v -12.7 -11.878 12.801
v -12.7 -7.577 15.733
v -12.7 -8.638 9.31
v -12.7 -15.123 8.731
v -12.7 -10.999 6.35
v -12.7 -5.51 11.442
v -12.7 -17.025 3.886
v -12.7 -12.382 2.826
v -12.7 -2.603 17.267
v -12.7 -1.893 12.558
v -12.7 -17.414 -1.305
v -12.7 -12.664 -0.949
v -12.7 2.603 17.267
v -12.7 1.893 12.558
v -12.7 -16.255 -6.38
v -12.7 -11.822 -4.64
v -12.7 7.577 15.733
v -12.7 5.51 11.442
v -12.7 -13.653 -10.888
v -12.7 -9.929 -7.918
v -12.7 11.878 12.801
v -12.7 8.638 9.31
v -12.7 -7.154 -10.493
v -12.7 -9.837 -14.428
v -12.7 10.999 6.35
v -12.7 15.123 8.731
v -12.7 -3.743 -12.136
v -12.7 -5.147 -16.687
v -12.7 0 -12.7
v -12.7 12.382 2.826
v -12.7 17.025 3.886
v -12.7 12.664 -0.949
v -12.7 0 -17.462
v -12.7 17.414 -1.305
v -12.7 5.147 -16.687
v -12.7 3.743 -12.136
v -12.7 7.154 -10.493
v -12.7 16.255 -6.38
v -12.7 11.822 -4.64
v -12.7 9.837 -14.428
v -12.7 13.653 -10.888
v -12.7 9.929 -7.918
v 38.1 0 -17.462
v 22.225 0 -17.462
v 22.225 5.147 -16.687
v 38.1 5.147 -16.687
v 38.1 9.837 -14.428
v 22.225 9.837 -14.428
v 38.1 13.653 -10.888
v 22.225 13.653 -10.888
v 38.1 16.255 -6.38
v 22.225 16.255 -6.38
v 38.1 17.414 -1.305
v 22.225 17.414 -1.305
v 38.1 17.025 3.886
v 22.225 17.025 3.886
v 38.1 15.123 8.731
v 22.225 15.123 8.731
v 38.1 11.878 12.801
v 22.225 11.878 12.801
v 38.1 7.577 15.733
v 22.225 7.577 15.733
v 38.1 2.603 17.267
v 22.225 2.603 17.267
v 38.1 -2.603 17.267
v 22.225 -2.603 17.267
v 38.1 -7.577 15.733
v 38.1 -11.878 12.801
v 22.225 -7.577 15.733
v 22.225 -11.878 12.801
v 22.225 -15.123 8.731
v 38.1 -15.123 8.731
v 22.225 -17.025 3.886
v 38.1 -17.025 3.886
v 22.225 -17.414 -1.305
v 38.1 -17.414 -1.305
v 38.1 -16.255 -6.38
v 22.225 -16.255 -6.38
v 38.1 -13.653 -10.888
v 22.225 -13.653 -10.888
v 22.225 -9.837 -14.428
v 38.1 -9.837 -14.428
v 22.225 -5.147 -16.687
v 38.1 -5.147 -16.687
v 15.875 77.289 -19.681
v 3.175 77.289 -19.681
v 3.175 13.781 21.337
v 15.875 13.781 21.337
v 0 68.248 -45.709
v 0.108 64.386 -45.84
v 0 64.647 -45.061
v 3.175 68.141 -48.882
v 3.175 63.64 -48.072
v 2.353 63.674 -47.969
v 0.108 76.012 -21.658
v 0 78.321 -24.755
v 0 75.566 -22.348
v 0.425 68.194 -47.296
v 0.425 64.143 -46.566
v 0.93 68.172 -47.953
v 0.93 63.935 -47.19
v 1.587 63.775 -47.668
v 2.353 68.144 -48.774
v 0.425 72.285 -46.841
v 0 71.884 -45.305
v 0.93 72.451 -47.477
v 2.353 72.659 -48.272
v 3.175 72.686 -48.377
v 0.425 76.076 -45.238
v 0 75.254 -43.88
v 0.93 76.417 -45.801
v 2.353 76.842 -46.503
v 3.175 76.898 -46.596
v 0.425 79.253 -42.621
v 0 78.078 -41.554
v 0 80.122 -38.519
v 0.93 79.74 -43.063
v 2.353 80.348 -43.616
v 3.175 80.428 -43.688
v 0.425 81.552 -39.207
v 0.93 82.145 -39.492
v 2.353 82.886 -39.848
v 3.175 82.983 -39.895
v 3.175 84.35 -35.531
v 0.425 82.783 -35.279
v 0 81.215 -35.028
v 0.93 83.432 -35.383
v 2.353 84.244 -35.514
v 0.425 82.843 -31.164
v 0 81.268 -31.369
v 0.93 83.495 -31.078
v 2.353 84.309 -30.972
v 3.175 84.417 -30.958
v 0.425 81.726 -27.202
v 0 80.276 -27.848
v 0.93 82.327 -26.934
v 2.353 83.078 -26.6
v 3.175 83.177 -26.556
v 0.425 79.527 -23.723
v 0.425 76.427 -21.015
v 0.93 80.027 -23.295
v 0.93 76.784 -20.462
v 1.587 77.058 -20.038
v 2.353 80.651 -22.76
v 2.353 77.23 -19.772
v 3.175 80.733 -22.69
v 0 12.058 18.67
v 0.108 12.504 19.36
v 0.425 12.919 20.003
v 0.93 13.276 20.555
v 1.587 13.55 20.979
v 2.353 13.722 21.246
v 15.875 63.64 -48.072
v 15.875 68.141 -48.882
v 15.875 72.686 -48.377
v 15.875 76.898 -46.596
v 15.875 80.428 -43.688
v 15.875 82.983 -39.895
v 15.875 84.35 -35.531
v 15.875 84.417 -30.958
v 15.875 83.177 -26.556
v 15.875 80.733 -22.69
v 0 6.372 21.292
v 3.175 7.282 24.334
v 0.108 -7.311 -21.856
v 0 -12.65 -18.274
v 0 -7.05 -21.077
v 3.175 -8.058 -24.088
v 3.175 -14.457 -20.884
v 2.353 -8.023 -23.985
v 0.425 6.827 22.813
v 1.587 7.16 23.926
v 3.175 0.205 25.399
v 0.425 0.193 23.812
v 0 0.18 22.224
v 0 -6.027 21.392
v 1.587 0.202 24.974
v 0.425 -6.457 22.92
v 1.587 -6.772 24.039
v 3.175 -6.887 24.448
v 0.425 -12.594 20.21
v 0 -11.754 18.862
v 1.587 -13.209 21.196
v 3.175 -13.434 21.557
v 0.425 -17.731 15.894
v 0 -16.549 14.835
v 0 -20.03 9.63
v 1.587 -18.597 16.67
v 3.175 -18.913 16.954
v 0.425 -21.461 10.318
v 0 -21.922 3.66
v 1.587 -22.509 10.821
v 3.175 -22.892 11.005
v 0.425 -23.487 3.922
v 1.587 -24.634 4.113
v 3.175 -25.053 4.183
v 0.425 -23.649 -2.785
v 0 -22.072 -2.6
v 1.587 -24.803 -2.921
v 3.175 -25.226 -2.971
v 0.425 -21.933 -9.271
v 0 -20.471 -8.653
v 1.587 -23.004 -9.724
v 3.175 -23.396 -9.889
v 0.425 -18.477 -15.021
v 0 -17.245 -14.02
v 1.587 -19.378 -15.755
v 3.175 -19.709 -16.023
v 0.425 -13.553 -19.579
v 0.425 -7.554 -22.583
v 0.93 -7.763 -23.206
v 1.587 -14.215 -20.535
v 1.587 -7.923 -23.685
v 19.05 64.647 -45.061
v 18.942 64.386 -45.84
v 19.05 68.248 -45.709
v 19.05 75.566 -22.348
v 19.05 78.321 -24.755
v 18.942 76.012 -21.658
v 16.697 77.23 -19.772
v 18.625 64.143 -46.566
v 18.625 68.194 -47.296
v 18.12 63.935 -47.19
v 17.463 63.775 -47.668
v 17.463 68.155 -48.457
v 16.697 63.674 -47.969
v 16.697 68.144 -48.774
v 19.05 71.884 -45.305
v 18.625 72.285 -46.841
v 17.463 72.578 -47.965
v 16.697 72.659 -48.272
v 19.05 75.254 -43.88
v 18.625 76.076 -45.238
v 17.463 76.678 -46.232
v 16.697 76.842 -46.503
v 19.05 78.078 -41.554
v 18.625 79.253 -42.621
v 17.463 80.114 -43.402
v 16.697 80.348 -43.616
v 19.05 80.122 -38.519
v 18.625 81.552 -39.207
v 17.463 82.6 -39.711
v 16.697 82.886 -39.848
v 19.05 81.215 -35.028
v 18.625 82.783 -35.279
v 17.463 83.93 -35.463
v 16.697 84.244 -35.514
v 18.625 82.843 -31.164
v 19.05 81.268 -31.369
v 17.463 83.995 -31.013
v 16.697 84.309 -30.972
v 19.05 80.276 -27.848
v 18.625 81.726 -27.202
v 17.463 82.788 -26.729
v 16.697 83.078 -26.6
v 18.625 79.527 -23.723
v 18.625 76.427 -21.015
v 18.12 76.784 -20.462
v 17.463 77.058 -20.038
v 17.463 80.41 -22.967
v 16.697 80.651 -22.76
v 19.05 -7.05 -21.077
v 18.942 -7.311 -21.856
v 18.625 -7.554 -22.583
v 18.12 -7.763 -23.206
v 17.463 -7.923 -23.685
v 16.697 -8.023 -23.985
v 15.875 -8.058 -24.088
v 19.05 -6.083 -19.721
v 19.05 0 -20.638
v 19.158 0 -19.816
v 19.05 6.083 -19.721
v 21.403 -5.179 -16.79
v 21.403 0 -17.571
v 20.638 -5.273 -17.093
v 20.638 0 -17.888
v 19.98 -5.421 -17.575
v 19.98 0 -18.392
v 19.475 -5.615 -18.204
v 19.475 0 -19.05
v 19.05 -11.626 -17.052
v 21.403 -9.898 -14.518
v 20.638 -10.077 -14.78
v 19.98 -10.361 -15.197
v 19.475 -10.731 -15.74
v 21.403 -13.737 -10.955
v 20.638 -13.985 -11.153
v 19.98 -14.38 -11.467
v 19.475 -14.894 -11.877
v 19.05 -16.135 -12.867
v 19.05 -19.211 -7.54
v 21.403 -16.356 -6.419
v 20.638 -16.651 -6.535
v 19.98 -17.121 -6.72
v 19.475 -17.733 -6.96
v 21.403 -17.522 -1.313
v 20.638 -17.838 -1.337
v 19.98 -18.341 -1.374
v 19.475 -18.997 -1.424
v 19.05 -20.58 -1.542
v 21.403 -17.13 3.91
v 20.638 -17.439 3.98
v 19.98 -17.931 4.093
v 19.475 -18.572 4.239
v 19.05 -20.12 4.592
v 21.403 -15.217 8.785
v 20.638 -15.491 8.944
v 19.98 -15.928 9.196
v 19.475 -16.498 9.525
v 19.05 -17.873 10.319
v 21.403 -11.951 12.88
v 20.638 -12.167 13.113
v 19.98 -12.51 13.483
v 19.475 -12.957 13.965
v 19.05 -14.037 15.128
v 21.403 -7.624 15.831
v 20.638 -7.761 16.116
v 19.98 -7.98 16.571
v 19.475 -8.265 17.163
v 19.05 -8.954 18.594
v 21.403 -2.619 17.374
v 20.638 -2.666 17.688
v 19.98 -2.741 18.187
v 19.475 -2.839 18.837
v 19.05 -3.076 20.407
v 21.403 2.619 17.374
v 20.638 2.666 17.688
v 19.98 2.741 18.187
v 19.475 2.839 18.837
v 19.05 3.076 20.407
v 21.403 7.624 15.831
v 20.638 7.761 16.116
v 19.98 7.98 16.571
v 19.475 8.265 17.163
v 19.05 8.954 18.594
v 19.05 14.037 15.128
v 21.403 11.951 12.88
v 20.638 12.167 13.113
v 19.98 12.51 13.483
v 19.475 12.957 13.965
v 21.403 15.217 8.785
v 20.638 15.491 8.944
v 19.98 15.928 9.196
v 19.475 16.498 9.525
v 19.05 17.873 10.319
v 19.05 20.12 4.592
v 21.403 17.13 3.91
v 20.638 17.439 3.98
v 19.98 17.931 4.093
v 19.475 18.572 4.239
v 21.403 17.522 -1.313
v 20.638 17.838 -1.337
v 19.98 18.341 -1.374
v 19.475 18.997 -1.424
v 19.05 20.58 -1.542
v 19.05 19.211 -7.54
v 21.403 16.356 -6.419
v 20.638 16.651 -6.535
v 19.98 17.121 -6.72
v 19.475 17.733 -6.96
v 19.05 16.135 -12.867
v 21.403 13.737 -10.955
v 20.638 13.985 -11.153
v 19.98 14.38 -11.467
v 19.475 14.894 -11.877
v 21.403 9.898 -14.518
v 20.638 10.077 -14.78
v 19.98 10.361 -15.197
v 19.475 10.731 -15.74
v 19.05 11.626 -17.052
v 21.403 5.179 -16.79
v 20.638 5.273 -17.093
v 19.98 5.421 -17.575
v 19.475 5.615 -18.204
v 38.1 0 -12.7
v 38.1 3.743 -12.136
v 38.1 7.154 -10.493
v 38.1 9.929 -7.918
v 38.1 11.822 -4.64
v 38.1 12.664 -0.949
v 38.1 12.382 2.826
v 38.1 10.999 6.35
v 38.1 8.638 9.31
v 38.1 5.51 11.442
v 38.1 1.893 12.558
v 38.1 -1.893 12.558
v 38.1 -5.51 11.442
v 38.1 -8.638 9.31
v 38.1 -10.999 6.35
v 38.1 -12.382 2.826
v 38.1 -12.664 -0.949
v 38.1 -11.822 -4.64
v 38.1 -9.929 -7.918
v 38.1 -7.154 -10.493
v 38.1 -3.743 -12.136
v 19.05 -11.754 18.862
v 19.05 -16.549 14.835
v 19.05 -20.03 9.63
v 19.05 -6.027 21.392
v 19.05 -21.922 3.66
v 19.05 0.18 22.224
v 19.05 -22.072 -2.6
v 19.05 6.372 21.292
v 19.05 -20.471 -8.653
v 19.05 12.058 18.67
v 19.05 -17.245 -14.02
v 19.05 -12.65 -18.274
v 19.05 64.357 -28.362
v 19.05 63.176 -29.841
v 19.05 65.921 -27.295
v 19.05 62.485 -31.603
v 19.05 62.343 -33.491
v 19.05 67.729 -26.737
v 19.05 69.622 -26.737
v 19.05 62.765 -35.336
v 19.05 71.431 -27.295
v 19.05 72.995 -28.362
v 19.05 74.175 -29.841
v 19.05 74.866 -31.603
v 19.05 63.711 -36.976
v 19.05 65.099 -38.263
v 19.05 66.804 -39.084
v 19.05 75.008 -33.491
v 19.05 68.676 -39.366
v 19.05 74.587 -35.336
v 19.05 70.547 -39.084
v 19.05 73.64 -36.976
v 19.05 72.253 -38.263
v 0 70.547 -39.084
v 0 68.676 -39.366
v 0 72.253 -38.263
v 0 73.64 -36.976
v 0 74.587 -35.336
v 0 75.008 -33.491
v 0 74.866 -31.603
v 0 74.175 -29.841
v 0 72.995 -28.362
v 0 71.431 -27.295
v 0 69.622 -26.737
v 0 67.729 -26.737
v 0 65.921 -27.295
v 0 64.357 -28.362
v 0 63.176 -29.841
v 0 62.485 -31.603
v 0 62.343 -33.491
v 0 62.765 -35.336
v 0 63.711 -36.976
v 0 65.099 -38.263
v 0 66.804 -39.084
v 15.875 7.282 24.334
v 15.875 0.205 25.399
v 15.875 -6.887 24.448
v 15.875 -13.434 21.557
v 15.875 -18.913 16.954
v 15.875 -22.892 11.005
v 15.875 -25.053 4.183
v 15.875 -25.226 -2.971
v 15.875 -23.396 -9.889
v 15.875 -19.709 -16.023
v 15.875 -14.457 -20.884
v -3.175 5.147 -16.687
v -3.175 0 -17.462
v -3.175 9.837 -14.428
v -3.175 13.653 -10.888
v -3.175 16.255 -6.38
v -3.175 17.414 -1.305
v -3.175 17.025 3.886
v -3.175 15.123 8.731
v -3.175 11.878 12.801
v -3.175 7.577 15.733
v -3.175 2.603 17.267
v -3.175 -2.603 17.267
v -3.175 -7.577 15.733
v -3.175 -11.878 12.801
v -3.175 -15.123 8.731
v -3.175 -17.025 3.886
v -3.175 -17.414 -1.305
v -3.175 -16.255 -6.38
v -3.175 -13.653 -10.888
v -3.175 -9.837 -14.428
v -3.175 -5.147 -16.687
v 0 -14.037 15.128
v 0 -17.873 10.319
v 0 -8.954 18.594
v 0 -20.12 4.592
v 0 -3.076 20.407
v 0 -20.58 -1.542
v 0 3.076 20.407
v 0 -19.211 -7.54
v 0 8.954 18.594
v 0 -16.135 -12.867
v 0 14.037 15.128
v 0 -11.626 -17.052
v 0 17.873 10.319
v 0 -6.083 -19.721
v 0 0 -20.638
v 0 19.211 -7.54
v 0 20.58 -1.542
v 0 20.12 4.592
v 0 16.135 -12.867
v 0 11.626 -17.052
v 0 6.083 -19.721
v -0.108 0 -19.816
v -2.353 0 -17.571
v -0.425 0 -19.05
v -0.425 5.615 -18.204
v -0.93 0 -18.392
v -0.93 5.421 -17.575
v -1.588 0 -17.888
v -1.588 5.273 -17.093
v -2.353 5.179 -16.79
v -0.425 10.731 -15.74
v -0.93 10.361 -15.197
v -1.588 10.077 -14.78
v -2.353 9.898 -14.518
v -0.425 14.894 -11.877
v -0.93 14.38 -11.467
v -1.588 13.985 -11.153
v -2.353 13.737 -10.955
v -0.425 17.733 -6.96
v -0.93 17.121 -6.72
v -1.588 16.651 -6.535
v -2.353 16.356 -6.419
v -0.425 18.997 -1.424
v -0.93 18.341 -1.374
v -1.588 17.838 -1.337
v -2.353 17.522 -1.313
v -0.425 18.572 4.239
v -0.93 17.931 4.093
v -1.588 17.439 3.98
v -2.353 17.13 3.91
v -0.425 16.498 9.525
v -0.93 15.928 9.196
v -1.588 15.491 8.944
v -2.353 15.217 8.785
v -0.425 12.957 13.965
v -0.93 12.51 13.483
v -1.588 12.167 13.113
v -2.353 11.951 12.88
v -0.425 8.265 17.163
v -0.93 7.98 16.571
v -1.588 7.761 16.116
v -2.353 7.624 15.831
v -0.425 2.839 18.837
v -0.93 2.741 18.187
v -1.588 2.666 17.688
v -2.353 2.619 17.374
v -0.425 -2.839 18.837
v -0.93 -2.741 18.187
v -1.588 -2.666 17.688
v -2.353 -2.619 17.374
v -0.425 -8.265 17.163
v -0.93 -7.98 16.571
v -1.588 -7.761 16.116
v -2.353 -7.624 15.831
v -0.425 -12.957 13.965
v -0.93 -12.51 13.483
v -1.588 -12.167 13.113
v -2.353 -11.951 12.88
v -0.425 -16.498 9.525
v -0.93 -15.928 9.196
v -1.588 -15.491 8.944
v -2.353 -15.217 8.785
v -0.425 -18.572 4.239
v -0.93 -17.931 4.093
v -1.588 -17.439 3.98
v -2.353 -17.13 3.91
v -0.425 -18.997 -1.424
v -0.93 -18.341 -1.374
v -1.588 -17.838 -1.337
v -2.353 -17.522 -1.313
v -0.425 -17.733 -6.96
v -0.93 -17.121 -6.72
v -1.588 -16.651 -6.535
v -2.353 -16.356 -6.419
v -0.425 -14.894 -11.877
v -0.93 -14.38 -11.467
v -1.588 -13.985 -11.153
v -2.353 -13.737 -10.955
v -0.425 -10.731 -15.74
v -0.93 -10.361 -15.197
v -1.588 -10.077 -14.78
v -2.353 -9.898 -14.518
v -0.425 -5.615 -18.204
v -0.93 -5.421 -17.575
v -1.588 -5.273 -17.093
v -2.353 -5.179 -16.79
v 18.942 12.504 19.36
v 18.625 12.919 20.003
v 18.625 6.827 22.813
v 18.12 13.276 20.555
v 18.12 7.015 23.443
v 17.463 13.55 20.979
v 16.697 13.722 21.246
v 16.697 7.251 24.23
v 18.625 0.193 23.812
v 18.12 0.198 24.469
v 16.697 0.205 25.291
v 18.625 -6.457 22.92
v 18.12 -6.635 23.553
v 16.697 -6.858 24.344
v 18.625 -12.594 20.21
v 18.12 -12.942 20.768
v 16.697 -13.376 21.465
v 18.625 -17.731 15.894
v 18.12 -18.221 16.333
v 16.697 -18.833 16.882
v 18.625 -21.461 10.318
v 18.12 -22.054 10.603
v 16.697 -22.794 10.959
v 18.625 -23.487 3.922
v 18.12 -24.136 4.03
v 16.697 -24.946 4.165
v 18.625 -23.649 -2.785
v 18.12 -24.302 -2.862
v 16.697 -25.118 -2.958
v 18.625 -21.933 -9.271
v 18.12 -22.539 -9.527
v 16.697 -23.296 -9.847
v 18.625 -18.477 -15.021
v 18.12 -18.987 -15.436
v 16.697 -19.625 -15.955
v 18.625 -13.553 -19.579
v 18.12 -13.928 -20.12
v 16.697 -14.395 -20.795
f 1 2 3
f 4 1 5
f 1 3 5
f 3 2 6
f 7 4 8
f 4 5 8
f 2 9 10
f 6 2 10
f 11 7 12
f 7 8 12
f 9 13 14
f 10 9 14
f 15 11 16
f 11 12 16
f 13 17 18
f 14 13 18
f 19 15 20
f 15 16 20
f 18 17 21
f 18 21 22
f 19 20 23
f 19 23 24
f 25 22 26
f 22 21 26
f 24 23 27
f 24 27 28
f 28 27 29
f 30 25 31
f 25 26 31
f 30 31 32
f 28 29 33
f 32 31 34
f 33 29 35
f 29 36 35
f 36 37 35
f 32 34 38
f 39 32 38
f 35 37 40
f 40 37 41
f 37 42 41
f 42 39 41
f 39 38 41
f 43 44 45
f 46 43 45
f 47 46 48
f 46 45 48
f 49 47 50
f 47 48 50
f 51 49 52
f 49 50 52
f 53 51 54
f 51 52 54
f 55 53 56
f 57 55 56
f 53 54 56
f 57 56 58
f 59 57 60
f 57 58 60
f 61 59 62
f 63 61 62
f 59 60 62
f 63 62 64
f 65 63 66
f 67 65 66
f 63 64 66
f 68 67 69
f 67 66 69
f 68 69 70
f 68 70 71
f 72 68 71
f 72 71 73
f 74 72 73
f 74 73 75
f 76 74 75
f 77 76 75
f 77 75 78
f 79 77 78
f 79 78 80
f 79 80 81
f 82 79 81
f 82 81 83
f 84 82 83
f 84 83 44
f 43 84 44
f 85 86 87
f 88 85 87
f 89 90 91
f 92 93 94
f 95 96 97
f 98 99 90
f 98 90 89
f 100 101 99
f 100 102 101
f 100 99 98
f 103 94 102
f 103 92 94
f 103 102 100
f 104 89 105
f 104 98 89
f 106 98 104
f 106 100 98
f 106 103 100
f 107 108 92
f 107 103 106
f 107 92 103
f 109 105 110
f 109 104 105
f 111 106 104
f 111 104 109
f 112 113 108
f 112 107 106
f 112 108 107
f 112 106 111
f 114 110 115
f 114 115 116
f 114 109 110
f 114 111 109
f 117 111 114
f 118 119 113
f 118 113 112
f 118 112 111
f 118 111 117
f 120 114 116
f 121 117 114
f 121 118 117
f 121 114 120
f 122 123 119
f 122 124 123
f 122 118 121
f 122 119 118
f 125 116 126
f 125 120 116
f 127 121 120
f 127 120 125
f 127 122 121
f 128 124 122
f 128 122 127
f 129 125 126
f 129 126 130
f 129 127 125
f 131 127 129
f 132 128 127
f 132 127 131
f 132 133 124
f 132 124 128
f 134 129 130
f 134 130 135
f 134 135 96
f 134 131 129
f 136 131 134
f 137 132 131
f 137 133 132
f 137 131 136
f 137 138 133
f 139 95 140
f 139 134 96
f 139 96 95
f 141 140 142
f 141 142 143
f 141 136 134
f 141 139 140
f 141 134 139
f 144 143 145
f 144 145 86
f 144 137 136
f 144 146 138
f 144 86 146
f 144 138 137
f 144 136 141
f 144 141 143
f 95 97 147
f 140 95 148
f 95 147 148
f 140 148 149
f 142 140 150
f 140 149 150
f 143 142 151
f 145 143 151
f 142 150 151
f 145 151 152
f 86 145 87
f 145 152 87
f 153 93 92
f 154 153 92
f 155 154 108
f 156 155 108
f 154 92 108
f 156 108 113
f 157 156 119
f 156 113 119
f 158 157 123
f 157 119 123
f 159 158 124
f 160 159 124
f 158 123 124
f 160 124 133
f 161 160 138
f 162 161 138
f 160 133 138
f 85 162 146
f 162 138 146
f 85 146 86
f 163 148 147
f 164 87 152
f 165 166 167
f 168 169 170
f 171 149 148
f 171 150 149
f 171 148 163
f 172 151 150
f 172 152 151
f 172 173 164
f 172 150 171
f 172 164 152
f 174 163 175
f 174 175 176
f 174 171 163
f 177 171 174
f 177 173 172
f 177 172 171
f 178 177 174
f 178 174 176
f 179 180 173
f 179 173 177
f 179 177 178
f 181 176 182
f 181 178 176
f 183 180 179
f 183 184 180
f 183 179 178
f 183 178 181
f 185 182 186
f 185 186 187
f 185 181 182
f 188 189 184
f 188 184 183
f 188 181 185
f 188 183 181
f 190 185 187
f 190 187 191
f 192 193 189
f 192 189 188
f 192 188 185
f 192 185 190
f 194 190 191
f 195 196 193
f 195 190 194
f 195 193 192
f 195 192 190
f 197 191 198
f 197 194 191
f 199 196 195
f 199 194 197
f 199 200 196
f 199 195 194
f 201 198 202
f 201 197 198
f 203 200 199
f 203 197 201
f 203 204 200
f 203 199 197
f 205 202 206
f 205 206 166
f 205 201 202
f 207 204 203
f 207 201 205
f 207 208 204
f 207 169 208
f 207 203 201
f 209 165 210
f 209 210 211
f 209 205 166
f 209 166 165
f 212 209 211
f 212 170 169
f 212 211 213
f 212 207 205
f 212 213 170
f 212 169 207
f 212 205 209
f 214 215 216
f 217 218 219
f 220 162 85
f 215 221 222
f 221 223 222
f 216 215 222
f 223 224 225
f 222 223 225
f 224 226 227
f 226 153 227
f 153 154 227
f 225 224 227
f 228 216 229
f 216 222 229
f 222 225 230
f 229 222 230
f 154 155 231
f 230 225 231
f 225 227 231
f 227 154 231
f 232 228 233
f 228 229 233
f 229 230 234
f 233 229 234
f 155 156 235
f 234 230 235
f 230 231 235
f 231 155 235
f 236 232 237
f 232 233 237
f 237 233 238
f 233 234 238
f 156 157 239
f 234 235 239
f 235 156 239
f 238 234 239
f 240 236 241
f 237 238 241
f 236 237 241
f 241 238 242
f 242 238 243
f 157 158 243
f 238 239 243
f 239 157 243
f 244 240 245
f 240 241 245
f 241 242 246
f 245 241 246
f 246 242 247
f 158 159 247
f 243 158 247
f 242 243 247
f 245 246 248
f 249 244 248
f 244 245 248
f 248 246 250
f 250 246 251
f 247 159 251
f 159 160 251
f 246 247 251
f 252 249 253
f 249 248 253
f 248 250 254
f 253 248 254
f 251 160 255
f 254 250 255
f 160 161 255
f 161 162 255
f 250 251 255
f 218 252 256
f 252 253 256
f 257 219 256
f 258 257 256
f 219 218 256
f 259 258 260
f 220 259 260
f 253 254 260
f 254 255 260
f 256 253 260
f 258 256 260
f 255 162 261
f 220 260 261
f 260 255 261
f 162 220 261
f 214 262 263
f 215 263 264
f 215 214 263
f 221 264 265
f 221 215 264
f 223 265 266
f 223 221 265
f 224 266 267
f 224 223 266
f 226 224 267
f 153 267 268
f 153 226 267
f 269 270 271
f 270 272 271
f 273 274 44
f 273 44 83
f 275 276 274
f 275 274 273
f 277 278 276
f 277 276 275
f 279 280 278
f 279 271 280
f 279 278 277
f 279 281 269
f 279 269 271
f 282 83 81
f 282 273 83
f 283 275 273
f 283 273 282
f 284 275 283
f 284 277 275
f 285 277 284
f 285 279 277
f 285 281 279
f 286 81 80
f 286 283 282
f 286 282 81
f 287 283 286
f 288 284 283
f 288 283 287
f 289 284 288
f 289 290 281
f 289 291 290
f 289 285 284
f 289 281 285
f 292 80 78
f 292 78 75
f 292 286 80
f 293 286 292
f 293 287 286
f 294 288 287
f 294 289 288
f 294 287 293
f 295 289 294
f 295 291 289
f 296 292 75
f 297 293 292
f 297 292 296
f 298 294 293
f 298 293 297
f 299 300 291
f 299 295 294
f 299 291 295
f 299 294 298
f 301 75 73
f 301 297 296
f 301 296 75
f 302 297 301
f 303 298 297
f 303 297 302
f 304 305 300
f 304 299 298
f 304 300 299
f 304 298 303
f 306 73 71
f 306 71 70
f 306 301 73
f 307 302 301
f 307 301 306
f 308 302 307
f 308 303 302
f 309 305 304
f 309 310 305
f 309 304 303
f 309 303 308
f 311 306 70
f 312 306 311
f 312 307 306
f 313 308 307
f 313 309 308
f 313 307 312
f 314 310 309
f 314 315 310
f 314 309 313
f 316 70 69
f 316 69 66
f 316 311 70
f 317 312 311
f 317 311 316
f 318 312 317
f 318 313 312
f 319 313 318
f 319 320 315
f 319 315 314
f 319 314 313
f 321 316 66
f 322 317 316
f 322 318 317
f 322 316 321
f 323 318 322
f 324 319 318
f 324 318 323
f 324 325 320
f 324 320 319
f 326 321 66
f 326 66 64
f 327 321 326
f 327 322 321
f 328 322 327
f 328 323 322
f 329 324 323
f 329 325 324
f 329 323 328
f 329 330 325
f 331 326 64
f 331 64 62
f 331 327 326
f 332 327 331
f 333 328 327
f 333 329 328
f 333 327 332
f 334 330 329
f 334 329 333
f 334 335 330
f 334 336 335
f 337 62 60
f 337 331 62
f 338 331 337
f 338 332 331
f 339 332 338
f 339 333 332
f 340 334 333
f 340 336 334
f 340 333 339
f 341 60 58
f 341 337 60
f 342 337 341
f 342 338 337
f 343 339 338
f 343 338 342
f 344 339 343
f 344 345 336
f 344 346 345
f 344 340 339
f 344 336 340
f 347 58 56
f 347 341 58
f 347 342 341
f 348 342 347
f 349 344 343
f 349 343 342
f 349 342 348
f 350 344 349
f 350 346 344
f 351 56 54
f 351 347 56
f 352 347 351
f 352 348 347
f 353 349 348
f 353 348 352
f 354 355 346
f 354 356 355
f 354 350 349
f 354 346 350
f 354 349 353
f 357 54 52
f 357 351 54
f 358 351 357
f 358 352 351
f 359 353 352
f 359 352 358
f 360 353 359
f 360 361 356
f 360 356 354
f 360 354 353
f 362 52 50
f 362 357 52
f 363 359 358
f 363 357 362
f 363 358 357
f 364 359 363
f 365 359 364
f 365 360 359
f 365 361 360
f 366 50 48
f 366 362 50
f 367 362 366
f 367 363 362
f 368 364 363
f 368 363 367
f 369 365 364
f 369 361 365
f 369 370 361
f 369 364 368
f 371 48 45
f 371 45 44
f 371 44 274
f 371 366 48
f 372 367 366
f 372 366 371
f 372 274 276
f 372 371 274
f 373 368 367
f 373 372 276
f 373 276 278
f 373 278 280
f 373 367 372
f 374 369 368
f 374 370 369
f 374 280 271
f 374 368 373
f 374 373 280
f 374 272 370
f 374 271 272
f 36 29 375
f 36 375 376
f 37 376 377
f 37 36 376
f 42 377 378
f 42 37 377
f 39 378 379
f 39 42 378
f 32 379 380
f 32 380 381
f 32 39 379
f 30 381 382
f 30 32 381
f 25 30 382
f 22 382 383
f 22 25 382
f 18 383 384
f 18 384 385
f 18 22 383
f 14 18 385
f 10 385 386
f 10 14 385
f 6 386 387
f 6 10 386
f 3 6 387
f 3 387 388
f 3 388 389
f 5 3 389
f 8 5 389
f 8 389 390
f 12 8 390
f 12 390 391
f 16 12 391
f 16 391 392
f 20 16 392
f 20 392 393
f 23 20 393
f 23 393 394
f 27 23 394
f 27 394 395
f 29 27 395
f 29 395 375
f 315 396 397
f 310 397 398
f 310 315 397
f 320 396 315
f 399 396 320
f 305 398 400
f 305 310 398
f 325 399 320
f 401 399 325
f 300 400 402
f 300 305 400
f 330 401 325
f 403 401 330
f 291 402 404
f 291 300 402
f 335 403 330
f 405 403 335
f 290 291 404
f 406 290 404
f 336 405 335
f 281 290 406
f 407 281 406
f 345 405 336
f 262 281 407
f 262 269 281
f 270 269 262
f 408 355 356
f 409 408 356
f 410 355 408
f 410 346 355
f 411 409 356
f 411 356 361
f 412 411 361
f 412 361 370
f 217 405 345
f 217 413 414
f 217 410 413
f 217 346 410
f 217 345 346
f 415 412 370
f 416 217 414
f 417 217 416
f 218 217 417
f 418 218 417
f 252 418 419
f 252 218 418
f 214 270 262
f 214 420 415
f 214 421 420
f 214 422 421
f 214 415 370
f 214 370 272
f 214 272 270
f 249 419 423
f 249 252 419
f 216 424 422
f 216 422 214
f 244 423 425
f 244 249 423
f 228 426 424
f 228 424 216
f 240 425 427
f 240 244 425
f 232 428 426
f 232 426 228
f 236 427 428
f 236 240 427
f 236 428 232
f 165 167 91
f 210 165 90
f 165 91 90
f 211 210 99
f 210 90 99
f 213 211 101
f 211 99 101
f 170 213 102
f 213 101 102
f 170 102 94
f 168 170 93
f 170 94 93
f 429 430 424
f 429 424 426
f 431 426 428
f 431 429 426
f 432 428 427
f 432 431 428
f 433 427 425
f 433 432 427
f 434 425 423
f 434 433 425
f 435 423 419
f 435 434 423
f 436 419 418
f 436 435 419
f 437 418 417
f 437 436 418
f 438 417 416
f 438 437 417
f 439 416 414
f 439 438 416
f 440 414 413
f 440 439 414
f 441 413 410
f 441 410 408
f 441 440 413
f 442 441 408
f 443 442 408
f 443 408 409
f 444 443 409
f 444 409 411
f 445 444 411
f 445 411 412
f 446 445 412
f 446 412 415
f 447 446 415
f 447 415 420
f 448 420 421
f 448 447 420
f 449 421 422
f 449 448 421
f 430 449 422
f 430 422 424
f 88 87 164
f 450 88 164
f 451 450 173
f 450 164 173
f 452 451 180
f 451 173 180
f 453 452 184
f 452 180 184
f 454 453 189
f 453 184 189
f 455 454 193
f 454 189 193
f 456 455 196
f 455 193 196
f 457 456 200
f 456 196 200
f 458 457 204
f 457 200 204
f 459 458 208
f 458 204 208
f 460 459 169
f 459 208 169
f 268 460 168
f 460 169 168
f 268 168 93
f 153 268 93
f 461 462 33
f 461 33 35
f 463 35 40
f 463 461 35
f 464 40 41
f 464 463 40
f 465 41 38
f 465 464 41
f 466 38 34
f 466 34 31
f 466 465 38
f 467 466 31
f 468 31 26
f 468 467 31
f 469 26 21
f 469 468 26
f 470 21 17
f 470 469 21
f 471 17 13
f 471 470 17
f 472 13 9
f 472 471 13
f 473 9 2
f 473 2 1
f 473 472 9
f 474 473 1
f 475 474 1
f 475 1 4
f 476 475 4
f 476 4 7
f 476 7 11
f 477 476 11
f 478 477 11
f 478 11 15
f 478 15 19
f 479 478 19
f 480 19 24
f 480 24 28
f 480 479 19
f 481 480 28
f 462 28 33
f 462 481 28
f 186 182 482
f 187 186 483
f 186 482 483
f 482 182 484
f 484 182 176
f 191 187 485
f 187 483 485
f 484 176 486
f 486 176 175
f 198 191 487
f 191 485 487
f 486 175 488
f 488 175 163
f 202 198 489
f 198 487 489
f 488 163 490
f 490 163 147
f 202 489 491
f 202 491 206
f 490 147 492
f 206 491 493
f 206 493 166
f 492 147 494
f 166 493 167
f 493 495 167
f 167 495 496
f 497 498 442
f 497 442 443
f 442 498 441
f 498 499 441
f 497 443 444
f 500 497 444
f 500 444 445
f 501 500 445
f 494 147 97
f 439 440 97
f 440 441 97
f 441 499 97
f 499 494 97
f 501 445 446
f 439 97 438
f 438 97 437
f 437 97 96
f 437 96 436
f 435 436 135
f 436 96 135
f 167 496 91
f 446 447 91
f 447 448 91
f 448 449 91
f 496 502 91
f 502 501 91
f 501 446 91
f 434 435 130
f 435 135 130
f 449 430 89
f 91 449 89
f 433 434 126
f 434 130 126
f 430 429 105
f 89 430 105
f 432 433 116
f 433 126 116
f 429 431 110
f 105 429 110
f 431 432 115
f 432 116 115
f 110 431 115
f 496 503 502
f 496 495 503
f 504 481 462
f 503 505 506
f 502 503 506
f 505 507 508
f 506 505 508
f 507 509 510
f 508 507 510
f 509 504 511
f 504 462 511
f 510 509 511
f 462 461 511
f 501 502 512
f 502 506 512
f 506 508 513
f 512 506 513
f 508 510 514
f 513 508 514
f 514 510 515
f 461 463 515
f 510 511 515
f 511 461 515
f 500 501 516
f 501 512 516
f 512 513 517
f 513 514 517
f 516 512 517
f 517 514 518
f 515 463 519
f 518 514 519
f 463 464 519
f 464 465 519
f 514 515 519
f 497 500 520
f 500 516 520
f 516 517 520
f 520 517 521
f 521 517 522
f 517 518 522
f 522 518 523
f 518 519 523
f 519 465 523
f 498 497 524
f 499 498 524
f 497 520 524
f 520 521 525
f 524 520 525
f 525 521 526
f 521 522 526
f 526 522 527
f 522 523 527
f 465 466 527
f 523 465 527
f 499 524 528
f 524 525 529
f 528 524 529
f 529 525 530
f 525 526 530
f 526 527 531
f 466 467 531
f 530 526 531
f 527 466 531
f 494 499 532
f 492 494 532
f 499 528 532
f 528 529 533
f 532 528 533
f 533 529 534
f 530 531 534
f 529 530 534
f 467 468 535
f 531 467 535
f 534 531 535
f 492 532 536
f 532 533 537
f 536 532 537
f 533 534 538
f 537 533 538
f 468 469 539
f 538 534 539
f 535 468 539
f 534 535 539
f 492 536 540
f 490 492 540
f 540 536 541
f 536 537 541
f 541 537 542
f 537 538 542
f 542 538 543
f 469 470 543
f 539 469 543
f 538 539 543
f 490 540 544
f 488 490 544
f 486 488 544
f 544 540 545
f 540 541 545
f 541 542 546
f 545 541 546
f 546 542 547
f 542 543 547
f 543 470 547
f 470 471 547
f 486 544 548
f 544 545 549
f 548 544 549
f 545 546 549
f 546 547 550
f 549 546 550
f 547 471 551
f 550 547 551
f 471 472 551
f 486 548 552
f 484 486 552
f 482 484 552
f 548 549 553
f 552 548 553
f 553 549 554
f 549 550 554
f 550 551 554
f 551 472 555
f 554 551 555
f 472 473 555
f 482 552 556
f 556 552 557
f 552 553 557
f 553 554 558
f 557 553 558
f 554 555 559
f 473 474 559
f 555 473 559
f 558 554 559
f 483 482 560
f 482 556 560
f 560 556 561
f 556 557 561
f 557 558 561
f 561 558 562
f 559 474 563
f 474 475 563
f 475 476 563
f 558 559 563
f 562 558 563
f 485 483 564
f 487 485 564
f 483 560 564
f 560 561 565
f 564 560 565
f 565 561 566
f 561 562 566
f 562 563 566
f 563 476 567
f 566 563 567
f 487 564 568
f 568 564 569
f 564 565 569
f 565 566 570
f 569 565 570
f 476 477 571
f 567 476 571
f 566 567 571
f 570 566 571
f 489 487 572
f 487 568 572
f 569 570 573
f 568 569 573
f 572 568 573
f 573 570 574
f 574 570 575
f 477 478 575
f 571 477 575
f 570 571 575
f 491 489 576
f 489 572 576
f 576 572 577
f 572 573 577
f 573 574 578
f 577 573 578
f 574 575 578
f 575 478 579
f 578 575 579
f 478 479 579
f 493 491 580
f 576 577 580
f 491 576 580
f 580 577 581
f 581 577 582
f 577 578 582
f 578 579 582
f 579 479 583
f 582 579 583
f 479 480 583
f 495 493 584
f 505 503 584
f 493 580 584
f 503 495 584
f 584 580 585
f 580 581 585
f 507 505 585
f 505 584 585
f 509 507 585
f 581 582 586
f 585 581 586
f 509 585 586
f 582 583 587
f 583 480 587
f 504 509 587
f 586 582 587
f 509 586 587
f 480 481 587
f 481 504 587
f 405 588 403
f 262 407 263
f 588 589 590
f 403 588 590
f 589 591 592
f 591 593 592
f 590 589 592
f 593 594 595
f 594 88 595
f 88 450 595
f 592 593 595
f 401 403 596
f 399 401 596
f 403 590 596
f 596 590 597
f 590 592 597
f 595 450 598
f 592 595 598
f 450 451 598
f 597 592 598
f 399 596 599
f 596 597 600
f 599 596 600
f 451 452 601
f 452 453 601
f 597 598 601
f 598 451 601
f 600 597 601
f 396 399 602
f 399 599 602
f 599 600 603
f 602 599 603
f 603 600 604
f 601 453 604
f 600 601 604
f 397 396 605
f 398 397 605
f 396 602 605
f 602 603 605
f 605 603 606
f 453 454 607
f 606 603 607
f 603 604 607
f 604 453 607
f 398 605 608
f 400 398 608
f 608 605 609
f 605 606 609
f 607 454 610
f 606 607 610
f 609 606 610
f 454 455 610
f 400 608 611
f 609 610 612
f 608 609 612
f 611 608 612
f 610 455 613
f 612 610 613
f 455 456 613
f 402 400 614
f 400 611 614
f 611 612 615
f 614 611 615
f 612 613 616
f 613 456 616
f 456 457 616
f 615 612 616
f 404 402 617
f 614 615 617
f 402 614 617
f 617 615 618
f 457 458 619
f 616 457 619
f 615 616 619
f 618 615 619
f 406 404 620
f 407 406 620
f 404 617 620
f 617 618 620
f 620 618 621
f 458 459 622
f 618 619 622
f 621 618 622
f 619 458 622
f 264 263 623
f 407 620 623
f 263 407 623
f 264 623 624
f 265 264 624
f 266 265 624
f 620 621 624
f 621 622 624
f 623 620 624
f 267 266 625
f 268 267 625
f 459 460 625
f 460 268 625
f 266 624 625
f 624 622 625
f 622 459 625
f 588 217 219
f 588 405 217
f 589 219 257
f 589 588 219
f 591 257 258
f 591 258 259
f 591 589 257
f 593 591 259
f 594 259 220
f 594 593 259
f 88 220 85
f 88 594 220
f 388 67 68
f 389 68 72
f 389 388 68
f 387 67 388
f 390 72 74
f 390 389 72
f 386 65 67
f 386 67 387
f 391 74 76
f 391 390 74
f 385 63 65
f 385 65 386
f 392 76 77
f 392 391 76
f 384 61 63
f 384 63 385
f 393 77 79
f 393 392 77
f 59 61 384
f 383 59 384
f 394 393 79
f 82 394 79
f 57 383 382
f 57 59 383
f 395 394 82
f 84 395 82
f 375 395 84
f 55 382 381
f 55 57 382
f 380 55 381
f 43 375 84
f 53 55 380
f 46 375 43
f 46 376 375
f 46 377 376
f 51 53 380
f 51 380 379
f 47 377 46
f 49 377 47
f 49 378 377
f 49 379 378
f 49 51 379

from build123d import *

# Parameters (mm, degrees)
SKETCH1_R           = 17.4625
SKETCH1_R_2         = 12.7
BOSS_EXTRUDE1_DEPTH = 12.7
BOSS_EXTRUDE2_START = 19.05
SKETCH1_3_R         = 6.35
SKETCH1_3_R_2       = 12.7
BOSS_EXTRUDE2_DEPTH = 19.05
BOSS_EXTRUDE3_START = 38.1
SKETCH1_4_R         = 17.4625
SKETCH1_4_R_2       = 12.7
BOSS_EXTRUDE3_DEPTH = 38.1
FILLET1_R           = 3.175


with BuildPart() as part:
    # Sketch1 → Boss-Extrude1 (new body)
    with BuildSketch(Plane(origin=(0, 0, 0), x_dir=(0, 0, -1), z_dir=(1, 0, 0))):
        Circle(SKETCH1_R)
        Circle(SKETCH1_R_2, mode=Mode.SUBTRACT)
    extrude(amount=-BOSS_EXTRUDE1_DEPTH)

    # Sketch1<3> → Boss-Extrude2 (add)
    with BuildSketch(Plane(origin=(0, 0, 0), x_dir=(0, 0, -1), z_dir=(1, 0, 0)).offset(BOSS_EXTRUDE2_START)):
        with BuildLine():
            Line((24.088040055, -8.057687403), (48.071506693, 63.6396466))
            ThreePointArc((48.071506693, 63.6396466), (39.894915337, 82.983138982), (19.681065043, 77.288615292))
            Line((19.681065043, 77.288615292), (-21.336666584, 13.780662505))
            ThreePointArc((-21.336666584, 13.780662505), (-11.005493886, -22.891900409), (24.088040055, -8.057687403))
        make_face()
        with Locations((33.016481658, 68.675701226)):
            Circle(SKETCH1_3_R, mode=Mode.SUBTRACT)
        Circle(SKETCH1_3_R_2, mode=Mode.SUBTRACT)
    extrude(amount=-BOSS_EXTRUDE2_DEPTH)

    # Sketch1<4> → Boss-Extrude3 (add)
    with BuildSketch(Plane(origin=(0, 0, 0), x_dir=(0, 0, -1), z_dir=(1, 0, 0)).offset(BOSS_EXTRUDE3_START)):
        Circle(SKETCH1_4_R)
        Circle(SKETCH1_4_R_2, mode=Mode.SUBTRACT)
    extrude(amount=-BOSS_EXTRUDE3_DEPTH)

    # Fillet1
    fillet1_edges = [part.edges().sort_by_distance(p)[0] for p in [
        (0, 45.534638899, 0.827800771),
        (0, 82.983138982, -39.894915337),
        (0, 27.790979598, -36.079773374),
        (19.05, 45.534638899, 0.827800771),
        (19.05, 82.983138982, -39.894915337),
        (19.05, 27.790979598, -36.079773374),
        (0, 0, 17.4625),
        (0, -22.891900409, 11.005493886),
        (19.05, -22.891900409, 11.005493886),
        (19.05, 0, 17.4625),
    ]]
    fillet(fillet1_edges, radius=FILLET1_R)


solid = part.part
